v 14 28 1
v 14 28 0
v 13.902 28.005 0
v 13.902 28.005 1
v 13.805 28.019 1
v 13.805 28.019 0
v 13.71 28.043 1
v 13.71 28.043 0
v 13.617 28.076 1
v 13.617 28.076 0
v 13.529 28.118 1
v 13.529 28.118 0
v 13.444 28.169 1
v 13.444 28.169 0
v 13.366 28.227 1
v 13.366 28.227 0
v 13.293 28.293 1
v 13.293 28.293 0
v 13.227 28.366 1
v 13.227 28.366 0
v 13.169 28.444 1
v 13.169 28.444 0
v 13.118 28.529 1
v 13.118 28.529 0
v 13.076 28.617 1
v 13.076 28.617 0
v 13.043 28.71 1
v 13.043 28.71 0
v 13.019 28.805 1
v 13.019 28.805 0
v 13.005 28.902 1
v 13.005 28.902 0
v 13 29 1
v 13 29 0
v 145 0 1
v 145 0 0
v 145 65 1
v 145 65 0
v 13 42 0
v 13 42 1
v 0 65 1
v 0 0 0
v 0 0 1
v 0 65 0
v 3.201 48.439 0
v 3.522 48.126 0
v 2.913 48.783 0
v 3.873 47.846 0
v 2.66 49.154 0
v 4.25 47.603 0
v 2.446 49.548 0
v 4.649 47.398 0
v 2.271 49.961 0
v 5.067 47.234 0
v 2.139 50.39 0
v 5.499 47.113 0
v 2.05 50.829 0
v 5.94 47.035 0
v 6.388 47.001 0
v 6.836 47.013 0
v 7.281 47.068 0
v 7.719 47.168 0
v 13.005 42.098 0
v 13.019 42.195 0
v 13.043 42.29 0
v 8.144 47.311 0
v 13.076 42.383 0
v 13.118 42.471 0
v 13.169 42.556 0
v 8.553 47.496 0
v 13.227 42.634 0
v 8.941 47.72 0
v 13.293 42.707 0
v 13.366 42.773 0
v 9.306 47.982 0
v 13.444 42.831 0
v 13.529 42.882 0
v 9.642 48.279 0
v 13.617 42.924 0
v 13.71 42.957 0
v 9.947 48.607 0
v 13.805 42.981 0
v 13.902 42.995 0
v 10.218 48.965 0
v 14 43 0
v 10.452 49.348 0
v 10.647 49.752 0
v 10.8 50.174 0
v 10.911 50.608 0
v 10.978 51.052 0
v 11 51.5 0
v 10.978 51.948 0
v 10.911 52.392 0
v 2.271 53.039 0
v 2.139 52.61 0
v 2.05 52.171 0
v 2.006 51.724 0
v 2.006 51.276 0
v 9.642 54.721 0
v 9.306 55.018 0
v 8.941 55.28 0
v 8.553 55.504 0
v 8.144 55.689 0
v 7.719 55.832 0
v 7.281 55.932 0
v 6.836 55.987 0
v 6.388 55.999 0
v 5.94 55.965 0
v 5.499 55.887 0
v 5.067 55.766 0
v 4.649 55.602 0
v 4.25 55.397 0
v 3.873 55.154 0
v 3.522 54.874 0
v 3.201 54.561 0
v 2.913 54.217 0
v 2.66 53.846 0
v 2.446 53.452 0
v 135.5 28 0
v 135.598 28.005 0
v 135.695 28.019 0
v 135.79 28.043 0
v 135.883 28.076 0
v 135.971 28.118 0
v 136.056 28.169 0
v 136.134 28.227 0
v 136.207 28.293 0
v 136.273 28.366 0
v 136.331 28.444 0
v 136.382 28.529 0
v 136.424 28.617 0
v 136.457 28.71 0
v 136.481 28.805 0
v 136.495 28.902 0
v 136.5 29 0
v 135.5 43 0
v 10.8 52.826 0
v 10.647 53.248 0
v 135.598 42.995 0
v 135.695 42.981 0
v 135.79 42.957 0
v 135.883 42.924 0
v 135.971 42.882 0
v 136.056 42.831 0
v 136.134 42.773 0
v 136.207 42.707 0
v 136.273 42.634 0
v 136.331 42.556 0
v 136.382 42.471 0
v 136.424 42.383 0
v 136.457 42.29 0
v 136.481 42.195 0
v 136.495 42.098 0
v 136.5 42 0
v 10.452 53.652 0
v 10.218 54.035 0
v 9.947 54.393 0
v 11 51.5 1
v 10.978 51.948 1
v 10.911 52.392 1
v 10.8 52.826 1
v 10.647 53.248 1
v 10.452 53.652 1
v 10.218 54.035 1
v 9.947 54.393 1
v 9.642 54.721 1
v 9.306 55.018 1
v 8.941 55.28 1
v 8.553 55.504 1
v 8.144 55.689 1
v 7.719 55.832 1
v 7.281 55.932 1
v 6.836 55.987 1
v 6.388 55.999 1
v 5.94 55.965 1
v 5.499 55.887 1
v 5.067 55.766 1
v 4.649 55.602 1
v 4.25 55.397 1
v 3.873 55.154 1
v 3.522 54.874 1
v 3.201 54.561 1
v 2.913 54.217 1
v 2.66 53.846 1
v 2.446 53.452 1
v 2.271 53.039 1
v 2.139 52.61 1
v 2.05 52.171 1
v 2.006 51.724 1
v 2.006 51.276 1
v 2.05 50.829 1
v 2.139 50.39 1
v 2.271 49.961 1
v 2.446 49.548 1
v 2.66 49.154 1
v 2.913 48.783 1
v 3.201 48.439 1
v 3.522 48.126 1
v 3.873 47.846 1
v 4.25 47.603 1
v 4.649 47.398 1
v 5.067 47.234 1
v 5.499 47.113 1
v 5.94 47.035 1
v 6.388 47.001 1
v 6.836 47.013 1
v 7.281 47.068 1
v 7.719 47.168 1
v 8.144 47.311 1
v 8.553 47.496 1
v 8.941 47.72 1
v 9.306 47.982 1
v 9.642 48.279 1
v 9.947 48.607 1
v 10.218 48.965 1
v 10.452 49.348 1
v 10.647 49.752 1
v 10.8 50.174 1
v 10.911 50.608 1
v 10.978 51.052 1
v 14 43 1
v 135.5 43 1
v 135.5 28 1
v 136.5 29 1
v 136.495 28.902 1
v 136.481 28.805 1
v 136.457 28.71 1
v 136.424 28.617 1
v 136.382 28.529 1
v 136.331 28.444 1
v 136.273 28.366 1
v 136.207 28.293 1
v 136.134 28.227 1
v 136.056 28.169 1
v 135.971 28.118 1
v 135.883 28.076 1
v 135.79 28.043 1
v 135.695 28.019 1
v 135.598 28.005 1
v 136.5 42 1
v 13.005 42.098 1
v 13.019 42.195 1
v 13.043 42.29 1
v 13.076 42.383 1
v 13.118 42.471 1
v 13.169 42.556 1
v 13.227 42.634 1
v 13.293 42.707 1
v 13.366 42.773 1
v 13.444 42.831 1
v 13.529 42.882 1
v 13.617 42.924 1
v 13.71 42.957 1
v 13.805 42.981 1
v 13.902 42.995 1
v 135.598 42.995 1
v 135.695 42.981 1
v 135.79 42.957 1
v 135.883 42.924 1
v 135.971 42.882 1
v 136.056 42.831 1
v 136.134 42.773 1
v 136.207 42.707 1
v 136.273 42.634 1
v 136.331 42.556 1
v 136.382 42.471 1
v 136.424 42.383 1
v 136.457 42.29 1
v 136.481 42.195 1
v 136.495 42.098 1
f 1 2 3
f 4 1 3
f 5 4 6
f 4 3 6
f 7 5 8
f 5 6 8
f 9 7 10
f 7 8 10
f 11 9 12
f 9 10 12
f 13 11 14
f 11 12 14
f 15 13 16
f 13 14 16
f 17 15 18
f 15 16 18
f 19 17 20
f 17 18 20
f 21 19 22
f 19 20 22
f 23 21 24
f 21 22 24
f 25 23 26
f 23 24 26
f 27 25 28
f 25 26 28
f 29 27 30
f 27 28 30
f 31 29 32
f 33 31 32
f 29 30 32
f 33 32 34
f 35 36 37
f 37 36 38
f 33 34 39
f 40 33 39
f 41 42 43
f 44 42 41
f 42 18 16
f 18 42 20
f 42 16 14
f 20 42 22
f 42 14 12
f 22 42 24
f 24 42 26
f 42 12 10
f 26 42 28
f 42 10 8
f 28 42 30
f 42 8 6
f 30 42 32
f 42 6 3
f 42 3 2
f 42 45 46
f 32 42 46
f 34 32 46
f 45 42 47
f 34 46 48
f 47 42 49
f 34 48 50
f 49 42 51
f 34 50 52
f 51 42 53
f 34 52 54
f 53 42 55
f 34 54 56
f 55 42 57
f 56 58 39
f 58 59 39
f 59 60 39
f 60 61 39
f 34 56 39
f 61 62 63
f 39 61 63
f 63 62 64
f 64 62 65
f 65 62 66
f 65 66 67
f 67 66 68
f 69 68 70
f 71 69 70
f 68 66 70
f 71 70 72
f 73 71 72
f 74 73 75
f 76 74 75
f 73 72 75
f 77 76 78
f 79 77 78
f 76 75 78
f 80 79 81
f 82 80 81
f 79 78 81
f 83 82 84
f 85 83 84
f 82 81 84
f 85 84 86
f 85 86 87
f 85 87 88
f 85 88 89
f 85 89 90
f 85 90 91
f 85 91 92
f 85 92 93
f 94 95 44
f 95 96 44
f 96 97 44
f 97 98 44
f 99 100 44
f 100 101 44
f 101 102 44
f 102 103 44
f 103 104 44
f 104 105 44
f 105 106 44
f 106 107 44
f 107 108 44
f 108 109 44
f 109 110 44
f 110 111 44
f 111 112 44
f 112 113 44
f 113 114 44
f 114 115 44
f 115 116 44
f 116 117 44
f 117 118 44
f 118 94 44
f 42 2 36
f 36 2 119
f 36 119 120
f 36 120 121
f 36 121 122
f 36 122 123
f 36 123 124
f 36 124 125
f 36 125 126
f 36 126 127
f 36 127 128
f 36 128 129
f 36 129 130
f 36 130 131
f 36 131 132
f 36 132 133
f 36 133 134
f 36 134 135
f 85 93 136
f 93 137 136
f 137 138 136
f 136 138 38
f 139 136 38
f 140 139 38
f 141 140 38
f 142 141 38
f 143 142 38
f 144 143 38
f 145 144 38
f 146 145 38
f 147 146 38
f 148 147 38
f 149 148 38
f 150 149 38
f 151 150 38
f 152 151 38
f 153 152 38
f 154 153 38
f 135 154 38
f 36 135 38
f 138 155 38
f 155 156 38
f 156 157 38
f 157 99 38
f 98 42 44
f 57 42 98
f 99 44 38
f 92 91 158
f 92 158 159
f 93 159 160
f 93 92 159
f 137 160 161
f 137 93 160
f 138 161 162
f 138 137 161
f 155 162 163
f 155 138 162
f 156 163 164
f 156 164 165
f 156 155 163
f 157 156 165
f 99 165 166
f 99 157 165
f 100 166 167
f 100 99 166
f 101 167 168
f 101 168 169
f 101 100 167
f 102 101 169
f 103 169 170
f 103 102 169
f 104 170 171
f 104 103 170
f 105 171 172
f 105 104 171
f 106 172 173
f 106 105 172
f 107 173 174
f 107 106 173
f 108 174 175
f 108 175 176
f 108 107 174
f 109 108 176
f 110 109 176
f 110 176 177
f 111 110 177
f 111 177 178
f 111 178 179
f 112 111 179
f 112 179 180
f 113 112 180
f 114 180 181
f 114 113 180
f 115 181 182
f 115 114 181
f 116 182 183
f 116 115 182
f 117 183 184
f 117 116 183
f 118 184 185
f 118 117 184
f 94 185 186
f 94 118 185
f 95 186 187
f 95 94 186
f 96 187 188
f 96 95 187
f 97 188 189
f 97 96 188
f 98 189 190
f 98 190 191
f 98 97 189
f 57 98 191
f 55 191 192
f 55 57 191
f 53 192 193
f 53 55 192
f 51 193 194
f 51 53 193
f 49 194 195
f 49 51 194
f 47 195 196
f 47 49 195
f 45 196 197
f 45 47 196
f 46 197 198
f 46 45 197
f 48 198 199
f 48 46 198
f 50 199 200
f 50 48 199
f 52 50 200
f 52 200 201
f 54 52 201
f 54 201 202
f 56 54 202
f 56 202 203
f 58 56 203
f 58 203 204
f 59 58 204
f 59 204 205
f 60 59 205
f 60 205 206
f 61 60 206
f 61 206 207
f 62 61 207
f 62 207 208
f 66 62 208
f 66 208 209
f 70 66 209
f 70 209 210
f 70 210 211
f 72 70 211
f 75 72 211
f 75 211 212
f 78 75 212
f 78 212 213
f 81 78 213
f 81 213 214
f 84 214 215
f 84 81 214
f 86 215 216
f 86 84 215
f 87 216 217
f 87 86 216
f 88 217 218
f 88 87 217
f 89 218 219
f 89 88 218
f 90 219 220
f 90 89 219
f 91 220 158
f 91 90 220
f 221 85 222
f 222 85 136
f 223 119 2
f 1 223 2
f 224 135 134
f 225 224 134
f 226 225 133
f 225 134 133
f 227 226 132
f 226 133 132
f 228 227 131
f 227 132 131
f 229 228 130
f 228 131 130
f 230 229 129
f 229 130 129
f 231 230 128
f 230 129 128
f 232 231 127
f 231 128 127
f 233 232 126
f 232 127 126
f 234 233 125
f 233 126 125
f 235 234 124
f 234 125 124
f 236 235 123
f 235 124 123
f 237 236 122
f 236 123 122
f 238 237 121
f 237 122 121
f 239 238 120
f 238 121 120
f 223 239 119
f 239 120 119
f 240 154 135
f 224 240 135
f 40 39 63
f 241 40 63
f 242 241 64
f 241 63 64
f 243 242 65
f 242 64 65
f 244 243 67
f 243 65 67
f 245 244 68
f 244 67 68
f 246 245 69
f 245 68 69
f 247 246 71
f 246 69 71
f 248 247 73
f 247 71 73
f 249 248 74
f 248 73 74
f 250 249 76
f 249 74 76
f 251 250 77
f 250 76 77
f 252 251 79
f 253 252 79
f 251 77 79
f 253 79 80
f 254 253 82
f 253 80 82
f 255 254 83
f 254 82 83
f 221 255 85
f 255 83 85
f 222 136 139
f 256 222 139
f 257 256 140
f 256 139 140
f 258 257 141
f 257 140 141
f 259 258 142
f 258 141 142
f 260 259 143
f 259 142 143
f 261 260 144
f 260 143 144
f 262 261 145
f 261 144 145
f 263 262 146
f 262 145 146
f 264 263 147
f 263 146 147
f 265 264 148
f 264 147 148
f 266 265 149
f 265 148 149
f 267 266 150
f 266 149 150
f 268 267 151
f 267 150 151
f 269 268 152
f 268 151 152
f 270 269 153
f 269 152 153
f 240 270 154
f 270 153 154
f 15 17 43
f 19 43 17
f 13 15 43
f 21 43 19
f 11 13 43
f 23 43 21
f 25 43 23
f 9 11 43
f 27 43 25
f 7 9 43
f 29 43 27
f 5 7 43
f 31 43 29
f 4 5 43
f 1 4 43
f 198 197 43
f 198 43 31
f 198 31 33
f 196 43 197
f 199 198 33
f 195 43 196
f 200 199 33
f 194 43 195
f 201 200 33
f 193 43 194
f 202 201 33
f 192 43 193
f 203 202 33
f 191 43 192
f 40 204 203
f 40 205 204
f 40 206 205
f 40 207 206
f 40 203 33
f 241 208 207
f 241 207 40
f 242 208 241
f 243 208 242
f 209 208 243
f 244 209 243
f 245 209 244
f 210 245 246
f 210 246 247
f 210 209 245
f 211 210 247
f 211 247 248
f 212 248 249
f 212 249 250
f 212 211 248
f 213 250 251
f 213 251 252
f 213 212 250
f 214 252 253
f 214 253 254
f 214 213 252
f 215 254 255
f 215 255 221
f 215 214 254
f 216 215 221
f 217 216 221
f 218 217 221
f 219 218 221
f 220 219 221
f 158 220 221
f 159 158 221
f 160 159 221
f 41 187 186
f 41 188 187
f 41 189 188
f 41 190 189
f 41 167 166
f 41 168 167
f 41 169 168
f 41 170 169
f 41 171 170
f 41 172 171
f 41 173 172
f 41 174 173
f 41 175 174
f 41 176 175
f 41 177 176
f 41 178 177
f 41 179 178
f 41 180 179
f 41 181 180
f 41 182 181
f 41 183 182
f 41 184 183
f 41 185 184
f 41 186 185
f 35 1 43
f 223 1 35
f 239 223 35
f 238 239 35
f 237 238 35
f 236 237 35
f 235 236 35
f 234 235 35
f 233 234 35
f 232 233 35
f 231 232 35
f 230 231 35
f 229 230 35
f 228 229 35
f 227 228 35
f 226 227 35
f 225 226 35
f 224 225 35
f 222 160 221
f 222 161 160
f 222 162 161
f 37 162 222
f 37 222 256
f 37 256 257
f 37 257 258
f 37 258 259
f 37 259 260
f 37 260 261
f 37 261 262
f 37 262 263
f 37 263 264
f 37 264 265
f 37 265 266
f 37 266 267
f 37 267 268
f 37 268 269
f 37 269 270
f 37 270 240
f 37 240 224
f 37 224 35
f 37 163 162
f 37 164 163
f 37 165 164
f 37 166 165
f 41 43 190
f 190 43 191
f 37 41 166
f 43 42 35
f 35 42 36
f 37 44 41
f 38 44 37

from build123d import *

# Parameters (mm, degrees)
F0_W     = 145
F0_H     = 65
F0_R     = 4.5
F1_DEPTH = 1


with BuildPart() as f1:
    # F0 (on Top) → F1 (new body)
    with BuildSketch(Plane.XY):
        with Locations((72.5, 32.5)):
            Rectangle(F0_W, F0_H)
        with Locations((6.5, 51.5)):
            Circle(F0_R, mode=Mode.SUBTRACT)
        with BuildLine():
            ThreePointArc((13, 42), (13.292893, 42.707107), (14, 43))
            Line((14, 43), (135.5, 43))
            ThreePointArc((135.5, 43), (136.207107, 42.707107), (136.5, 42))
            Line((136.5, 42), (136.5, 29))
            ThreePointArc((136.5, 29), (136.207107, 28.292893), (135.5, 28))
            Line((135.5, 28), (14, 28))
            ThreePointArc((14, 28), (13.292893, 28.292893), (13, 29))
            Line((13, 29), (13, 42))
        make_face(mode=Mode.SUBTRACT)
    extrude(amount=F1_DEPTH)


solid = f1.part
